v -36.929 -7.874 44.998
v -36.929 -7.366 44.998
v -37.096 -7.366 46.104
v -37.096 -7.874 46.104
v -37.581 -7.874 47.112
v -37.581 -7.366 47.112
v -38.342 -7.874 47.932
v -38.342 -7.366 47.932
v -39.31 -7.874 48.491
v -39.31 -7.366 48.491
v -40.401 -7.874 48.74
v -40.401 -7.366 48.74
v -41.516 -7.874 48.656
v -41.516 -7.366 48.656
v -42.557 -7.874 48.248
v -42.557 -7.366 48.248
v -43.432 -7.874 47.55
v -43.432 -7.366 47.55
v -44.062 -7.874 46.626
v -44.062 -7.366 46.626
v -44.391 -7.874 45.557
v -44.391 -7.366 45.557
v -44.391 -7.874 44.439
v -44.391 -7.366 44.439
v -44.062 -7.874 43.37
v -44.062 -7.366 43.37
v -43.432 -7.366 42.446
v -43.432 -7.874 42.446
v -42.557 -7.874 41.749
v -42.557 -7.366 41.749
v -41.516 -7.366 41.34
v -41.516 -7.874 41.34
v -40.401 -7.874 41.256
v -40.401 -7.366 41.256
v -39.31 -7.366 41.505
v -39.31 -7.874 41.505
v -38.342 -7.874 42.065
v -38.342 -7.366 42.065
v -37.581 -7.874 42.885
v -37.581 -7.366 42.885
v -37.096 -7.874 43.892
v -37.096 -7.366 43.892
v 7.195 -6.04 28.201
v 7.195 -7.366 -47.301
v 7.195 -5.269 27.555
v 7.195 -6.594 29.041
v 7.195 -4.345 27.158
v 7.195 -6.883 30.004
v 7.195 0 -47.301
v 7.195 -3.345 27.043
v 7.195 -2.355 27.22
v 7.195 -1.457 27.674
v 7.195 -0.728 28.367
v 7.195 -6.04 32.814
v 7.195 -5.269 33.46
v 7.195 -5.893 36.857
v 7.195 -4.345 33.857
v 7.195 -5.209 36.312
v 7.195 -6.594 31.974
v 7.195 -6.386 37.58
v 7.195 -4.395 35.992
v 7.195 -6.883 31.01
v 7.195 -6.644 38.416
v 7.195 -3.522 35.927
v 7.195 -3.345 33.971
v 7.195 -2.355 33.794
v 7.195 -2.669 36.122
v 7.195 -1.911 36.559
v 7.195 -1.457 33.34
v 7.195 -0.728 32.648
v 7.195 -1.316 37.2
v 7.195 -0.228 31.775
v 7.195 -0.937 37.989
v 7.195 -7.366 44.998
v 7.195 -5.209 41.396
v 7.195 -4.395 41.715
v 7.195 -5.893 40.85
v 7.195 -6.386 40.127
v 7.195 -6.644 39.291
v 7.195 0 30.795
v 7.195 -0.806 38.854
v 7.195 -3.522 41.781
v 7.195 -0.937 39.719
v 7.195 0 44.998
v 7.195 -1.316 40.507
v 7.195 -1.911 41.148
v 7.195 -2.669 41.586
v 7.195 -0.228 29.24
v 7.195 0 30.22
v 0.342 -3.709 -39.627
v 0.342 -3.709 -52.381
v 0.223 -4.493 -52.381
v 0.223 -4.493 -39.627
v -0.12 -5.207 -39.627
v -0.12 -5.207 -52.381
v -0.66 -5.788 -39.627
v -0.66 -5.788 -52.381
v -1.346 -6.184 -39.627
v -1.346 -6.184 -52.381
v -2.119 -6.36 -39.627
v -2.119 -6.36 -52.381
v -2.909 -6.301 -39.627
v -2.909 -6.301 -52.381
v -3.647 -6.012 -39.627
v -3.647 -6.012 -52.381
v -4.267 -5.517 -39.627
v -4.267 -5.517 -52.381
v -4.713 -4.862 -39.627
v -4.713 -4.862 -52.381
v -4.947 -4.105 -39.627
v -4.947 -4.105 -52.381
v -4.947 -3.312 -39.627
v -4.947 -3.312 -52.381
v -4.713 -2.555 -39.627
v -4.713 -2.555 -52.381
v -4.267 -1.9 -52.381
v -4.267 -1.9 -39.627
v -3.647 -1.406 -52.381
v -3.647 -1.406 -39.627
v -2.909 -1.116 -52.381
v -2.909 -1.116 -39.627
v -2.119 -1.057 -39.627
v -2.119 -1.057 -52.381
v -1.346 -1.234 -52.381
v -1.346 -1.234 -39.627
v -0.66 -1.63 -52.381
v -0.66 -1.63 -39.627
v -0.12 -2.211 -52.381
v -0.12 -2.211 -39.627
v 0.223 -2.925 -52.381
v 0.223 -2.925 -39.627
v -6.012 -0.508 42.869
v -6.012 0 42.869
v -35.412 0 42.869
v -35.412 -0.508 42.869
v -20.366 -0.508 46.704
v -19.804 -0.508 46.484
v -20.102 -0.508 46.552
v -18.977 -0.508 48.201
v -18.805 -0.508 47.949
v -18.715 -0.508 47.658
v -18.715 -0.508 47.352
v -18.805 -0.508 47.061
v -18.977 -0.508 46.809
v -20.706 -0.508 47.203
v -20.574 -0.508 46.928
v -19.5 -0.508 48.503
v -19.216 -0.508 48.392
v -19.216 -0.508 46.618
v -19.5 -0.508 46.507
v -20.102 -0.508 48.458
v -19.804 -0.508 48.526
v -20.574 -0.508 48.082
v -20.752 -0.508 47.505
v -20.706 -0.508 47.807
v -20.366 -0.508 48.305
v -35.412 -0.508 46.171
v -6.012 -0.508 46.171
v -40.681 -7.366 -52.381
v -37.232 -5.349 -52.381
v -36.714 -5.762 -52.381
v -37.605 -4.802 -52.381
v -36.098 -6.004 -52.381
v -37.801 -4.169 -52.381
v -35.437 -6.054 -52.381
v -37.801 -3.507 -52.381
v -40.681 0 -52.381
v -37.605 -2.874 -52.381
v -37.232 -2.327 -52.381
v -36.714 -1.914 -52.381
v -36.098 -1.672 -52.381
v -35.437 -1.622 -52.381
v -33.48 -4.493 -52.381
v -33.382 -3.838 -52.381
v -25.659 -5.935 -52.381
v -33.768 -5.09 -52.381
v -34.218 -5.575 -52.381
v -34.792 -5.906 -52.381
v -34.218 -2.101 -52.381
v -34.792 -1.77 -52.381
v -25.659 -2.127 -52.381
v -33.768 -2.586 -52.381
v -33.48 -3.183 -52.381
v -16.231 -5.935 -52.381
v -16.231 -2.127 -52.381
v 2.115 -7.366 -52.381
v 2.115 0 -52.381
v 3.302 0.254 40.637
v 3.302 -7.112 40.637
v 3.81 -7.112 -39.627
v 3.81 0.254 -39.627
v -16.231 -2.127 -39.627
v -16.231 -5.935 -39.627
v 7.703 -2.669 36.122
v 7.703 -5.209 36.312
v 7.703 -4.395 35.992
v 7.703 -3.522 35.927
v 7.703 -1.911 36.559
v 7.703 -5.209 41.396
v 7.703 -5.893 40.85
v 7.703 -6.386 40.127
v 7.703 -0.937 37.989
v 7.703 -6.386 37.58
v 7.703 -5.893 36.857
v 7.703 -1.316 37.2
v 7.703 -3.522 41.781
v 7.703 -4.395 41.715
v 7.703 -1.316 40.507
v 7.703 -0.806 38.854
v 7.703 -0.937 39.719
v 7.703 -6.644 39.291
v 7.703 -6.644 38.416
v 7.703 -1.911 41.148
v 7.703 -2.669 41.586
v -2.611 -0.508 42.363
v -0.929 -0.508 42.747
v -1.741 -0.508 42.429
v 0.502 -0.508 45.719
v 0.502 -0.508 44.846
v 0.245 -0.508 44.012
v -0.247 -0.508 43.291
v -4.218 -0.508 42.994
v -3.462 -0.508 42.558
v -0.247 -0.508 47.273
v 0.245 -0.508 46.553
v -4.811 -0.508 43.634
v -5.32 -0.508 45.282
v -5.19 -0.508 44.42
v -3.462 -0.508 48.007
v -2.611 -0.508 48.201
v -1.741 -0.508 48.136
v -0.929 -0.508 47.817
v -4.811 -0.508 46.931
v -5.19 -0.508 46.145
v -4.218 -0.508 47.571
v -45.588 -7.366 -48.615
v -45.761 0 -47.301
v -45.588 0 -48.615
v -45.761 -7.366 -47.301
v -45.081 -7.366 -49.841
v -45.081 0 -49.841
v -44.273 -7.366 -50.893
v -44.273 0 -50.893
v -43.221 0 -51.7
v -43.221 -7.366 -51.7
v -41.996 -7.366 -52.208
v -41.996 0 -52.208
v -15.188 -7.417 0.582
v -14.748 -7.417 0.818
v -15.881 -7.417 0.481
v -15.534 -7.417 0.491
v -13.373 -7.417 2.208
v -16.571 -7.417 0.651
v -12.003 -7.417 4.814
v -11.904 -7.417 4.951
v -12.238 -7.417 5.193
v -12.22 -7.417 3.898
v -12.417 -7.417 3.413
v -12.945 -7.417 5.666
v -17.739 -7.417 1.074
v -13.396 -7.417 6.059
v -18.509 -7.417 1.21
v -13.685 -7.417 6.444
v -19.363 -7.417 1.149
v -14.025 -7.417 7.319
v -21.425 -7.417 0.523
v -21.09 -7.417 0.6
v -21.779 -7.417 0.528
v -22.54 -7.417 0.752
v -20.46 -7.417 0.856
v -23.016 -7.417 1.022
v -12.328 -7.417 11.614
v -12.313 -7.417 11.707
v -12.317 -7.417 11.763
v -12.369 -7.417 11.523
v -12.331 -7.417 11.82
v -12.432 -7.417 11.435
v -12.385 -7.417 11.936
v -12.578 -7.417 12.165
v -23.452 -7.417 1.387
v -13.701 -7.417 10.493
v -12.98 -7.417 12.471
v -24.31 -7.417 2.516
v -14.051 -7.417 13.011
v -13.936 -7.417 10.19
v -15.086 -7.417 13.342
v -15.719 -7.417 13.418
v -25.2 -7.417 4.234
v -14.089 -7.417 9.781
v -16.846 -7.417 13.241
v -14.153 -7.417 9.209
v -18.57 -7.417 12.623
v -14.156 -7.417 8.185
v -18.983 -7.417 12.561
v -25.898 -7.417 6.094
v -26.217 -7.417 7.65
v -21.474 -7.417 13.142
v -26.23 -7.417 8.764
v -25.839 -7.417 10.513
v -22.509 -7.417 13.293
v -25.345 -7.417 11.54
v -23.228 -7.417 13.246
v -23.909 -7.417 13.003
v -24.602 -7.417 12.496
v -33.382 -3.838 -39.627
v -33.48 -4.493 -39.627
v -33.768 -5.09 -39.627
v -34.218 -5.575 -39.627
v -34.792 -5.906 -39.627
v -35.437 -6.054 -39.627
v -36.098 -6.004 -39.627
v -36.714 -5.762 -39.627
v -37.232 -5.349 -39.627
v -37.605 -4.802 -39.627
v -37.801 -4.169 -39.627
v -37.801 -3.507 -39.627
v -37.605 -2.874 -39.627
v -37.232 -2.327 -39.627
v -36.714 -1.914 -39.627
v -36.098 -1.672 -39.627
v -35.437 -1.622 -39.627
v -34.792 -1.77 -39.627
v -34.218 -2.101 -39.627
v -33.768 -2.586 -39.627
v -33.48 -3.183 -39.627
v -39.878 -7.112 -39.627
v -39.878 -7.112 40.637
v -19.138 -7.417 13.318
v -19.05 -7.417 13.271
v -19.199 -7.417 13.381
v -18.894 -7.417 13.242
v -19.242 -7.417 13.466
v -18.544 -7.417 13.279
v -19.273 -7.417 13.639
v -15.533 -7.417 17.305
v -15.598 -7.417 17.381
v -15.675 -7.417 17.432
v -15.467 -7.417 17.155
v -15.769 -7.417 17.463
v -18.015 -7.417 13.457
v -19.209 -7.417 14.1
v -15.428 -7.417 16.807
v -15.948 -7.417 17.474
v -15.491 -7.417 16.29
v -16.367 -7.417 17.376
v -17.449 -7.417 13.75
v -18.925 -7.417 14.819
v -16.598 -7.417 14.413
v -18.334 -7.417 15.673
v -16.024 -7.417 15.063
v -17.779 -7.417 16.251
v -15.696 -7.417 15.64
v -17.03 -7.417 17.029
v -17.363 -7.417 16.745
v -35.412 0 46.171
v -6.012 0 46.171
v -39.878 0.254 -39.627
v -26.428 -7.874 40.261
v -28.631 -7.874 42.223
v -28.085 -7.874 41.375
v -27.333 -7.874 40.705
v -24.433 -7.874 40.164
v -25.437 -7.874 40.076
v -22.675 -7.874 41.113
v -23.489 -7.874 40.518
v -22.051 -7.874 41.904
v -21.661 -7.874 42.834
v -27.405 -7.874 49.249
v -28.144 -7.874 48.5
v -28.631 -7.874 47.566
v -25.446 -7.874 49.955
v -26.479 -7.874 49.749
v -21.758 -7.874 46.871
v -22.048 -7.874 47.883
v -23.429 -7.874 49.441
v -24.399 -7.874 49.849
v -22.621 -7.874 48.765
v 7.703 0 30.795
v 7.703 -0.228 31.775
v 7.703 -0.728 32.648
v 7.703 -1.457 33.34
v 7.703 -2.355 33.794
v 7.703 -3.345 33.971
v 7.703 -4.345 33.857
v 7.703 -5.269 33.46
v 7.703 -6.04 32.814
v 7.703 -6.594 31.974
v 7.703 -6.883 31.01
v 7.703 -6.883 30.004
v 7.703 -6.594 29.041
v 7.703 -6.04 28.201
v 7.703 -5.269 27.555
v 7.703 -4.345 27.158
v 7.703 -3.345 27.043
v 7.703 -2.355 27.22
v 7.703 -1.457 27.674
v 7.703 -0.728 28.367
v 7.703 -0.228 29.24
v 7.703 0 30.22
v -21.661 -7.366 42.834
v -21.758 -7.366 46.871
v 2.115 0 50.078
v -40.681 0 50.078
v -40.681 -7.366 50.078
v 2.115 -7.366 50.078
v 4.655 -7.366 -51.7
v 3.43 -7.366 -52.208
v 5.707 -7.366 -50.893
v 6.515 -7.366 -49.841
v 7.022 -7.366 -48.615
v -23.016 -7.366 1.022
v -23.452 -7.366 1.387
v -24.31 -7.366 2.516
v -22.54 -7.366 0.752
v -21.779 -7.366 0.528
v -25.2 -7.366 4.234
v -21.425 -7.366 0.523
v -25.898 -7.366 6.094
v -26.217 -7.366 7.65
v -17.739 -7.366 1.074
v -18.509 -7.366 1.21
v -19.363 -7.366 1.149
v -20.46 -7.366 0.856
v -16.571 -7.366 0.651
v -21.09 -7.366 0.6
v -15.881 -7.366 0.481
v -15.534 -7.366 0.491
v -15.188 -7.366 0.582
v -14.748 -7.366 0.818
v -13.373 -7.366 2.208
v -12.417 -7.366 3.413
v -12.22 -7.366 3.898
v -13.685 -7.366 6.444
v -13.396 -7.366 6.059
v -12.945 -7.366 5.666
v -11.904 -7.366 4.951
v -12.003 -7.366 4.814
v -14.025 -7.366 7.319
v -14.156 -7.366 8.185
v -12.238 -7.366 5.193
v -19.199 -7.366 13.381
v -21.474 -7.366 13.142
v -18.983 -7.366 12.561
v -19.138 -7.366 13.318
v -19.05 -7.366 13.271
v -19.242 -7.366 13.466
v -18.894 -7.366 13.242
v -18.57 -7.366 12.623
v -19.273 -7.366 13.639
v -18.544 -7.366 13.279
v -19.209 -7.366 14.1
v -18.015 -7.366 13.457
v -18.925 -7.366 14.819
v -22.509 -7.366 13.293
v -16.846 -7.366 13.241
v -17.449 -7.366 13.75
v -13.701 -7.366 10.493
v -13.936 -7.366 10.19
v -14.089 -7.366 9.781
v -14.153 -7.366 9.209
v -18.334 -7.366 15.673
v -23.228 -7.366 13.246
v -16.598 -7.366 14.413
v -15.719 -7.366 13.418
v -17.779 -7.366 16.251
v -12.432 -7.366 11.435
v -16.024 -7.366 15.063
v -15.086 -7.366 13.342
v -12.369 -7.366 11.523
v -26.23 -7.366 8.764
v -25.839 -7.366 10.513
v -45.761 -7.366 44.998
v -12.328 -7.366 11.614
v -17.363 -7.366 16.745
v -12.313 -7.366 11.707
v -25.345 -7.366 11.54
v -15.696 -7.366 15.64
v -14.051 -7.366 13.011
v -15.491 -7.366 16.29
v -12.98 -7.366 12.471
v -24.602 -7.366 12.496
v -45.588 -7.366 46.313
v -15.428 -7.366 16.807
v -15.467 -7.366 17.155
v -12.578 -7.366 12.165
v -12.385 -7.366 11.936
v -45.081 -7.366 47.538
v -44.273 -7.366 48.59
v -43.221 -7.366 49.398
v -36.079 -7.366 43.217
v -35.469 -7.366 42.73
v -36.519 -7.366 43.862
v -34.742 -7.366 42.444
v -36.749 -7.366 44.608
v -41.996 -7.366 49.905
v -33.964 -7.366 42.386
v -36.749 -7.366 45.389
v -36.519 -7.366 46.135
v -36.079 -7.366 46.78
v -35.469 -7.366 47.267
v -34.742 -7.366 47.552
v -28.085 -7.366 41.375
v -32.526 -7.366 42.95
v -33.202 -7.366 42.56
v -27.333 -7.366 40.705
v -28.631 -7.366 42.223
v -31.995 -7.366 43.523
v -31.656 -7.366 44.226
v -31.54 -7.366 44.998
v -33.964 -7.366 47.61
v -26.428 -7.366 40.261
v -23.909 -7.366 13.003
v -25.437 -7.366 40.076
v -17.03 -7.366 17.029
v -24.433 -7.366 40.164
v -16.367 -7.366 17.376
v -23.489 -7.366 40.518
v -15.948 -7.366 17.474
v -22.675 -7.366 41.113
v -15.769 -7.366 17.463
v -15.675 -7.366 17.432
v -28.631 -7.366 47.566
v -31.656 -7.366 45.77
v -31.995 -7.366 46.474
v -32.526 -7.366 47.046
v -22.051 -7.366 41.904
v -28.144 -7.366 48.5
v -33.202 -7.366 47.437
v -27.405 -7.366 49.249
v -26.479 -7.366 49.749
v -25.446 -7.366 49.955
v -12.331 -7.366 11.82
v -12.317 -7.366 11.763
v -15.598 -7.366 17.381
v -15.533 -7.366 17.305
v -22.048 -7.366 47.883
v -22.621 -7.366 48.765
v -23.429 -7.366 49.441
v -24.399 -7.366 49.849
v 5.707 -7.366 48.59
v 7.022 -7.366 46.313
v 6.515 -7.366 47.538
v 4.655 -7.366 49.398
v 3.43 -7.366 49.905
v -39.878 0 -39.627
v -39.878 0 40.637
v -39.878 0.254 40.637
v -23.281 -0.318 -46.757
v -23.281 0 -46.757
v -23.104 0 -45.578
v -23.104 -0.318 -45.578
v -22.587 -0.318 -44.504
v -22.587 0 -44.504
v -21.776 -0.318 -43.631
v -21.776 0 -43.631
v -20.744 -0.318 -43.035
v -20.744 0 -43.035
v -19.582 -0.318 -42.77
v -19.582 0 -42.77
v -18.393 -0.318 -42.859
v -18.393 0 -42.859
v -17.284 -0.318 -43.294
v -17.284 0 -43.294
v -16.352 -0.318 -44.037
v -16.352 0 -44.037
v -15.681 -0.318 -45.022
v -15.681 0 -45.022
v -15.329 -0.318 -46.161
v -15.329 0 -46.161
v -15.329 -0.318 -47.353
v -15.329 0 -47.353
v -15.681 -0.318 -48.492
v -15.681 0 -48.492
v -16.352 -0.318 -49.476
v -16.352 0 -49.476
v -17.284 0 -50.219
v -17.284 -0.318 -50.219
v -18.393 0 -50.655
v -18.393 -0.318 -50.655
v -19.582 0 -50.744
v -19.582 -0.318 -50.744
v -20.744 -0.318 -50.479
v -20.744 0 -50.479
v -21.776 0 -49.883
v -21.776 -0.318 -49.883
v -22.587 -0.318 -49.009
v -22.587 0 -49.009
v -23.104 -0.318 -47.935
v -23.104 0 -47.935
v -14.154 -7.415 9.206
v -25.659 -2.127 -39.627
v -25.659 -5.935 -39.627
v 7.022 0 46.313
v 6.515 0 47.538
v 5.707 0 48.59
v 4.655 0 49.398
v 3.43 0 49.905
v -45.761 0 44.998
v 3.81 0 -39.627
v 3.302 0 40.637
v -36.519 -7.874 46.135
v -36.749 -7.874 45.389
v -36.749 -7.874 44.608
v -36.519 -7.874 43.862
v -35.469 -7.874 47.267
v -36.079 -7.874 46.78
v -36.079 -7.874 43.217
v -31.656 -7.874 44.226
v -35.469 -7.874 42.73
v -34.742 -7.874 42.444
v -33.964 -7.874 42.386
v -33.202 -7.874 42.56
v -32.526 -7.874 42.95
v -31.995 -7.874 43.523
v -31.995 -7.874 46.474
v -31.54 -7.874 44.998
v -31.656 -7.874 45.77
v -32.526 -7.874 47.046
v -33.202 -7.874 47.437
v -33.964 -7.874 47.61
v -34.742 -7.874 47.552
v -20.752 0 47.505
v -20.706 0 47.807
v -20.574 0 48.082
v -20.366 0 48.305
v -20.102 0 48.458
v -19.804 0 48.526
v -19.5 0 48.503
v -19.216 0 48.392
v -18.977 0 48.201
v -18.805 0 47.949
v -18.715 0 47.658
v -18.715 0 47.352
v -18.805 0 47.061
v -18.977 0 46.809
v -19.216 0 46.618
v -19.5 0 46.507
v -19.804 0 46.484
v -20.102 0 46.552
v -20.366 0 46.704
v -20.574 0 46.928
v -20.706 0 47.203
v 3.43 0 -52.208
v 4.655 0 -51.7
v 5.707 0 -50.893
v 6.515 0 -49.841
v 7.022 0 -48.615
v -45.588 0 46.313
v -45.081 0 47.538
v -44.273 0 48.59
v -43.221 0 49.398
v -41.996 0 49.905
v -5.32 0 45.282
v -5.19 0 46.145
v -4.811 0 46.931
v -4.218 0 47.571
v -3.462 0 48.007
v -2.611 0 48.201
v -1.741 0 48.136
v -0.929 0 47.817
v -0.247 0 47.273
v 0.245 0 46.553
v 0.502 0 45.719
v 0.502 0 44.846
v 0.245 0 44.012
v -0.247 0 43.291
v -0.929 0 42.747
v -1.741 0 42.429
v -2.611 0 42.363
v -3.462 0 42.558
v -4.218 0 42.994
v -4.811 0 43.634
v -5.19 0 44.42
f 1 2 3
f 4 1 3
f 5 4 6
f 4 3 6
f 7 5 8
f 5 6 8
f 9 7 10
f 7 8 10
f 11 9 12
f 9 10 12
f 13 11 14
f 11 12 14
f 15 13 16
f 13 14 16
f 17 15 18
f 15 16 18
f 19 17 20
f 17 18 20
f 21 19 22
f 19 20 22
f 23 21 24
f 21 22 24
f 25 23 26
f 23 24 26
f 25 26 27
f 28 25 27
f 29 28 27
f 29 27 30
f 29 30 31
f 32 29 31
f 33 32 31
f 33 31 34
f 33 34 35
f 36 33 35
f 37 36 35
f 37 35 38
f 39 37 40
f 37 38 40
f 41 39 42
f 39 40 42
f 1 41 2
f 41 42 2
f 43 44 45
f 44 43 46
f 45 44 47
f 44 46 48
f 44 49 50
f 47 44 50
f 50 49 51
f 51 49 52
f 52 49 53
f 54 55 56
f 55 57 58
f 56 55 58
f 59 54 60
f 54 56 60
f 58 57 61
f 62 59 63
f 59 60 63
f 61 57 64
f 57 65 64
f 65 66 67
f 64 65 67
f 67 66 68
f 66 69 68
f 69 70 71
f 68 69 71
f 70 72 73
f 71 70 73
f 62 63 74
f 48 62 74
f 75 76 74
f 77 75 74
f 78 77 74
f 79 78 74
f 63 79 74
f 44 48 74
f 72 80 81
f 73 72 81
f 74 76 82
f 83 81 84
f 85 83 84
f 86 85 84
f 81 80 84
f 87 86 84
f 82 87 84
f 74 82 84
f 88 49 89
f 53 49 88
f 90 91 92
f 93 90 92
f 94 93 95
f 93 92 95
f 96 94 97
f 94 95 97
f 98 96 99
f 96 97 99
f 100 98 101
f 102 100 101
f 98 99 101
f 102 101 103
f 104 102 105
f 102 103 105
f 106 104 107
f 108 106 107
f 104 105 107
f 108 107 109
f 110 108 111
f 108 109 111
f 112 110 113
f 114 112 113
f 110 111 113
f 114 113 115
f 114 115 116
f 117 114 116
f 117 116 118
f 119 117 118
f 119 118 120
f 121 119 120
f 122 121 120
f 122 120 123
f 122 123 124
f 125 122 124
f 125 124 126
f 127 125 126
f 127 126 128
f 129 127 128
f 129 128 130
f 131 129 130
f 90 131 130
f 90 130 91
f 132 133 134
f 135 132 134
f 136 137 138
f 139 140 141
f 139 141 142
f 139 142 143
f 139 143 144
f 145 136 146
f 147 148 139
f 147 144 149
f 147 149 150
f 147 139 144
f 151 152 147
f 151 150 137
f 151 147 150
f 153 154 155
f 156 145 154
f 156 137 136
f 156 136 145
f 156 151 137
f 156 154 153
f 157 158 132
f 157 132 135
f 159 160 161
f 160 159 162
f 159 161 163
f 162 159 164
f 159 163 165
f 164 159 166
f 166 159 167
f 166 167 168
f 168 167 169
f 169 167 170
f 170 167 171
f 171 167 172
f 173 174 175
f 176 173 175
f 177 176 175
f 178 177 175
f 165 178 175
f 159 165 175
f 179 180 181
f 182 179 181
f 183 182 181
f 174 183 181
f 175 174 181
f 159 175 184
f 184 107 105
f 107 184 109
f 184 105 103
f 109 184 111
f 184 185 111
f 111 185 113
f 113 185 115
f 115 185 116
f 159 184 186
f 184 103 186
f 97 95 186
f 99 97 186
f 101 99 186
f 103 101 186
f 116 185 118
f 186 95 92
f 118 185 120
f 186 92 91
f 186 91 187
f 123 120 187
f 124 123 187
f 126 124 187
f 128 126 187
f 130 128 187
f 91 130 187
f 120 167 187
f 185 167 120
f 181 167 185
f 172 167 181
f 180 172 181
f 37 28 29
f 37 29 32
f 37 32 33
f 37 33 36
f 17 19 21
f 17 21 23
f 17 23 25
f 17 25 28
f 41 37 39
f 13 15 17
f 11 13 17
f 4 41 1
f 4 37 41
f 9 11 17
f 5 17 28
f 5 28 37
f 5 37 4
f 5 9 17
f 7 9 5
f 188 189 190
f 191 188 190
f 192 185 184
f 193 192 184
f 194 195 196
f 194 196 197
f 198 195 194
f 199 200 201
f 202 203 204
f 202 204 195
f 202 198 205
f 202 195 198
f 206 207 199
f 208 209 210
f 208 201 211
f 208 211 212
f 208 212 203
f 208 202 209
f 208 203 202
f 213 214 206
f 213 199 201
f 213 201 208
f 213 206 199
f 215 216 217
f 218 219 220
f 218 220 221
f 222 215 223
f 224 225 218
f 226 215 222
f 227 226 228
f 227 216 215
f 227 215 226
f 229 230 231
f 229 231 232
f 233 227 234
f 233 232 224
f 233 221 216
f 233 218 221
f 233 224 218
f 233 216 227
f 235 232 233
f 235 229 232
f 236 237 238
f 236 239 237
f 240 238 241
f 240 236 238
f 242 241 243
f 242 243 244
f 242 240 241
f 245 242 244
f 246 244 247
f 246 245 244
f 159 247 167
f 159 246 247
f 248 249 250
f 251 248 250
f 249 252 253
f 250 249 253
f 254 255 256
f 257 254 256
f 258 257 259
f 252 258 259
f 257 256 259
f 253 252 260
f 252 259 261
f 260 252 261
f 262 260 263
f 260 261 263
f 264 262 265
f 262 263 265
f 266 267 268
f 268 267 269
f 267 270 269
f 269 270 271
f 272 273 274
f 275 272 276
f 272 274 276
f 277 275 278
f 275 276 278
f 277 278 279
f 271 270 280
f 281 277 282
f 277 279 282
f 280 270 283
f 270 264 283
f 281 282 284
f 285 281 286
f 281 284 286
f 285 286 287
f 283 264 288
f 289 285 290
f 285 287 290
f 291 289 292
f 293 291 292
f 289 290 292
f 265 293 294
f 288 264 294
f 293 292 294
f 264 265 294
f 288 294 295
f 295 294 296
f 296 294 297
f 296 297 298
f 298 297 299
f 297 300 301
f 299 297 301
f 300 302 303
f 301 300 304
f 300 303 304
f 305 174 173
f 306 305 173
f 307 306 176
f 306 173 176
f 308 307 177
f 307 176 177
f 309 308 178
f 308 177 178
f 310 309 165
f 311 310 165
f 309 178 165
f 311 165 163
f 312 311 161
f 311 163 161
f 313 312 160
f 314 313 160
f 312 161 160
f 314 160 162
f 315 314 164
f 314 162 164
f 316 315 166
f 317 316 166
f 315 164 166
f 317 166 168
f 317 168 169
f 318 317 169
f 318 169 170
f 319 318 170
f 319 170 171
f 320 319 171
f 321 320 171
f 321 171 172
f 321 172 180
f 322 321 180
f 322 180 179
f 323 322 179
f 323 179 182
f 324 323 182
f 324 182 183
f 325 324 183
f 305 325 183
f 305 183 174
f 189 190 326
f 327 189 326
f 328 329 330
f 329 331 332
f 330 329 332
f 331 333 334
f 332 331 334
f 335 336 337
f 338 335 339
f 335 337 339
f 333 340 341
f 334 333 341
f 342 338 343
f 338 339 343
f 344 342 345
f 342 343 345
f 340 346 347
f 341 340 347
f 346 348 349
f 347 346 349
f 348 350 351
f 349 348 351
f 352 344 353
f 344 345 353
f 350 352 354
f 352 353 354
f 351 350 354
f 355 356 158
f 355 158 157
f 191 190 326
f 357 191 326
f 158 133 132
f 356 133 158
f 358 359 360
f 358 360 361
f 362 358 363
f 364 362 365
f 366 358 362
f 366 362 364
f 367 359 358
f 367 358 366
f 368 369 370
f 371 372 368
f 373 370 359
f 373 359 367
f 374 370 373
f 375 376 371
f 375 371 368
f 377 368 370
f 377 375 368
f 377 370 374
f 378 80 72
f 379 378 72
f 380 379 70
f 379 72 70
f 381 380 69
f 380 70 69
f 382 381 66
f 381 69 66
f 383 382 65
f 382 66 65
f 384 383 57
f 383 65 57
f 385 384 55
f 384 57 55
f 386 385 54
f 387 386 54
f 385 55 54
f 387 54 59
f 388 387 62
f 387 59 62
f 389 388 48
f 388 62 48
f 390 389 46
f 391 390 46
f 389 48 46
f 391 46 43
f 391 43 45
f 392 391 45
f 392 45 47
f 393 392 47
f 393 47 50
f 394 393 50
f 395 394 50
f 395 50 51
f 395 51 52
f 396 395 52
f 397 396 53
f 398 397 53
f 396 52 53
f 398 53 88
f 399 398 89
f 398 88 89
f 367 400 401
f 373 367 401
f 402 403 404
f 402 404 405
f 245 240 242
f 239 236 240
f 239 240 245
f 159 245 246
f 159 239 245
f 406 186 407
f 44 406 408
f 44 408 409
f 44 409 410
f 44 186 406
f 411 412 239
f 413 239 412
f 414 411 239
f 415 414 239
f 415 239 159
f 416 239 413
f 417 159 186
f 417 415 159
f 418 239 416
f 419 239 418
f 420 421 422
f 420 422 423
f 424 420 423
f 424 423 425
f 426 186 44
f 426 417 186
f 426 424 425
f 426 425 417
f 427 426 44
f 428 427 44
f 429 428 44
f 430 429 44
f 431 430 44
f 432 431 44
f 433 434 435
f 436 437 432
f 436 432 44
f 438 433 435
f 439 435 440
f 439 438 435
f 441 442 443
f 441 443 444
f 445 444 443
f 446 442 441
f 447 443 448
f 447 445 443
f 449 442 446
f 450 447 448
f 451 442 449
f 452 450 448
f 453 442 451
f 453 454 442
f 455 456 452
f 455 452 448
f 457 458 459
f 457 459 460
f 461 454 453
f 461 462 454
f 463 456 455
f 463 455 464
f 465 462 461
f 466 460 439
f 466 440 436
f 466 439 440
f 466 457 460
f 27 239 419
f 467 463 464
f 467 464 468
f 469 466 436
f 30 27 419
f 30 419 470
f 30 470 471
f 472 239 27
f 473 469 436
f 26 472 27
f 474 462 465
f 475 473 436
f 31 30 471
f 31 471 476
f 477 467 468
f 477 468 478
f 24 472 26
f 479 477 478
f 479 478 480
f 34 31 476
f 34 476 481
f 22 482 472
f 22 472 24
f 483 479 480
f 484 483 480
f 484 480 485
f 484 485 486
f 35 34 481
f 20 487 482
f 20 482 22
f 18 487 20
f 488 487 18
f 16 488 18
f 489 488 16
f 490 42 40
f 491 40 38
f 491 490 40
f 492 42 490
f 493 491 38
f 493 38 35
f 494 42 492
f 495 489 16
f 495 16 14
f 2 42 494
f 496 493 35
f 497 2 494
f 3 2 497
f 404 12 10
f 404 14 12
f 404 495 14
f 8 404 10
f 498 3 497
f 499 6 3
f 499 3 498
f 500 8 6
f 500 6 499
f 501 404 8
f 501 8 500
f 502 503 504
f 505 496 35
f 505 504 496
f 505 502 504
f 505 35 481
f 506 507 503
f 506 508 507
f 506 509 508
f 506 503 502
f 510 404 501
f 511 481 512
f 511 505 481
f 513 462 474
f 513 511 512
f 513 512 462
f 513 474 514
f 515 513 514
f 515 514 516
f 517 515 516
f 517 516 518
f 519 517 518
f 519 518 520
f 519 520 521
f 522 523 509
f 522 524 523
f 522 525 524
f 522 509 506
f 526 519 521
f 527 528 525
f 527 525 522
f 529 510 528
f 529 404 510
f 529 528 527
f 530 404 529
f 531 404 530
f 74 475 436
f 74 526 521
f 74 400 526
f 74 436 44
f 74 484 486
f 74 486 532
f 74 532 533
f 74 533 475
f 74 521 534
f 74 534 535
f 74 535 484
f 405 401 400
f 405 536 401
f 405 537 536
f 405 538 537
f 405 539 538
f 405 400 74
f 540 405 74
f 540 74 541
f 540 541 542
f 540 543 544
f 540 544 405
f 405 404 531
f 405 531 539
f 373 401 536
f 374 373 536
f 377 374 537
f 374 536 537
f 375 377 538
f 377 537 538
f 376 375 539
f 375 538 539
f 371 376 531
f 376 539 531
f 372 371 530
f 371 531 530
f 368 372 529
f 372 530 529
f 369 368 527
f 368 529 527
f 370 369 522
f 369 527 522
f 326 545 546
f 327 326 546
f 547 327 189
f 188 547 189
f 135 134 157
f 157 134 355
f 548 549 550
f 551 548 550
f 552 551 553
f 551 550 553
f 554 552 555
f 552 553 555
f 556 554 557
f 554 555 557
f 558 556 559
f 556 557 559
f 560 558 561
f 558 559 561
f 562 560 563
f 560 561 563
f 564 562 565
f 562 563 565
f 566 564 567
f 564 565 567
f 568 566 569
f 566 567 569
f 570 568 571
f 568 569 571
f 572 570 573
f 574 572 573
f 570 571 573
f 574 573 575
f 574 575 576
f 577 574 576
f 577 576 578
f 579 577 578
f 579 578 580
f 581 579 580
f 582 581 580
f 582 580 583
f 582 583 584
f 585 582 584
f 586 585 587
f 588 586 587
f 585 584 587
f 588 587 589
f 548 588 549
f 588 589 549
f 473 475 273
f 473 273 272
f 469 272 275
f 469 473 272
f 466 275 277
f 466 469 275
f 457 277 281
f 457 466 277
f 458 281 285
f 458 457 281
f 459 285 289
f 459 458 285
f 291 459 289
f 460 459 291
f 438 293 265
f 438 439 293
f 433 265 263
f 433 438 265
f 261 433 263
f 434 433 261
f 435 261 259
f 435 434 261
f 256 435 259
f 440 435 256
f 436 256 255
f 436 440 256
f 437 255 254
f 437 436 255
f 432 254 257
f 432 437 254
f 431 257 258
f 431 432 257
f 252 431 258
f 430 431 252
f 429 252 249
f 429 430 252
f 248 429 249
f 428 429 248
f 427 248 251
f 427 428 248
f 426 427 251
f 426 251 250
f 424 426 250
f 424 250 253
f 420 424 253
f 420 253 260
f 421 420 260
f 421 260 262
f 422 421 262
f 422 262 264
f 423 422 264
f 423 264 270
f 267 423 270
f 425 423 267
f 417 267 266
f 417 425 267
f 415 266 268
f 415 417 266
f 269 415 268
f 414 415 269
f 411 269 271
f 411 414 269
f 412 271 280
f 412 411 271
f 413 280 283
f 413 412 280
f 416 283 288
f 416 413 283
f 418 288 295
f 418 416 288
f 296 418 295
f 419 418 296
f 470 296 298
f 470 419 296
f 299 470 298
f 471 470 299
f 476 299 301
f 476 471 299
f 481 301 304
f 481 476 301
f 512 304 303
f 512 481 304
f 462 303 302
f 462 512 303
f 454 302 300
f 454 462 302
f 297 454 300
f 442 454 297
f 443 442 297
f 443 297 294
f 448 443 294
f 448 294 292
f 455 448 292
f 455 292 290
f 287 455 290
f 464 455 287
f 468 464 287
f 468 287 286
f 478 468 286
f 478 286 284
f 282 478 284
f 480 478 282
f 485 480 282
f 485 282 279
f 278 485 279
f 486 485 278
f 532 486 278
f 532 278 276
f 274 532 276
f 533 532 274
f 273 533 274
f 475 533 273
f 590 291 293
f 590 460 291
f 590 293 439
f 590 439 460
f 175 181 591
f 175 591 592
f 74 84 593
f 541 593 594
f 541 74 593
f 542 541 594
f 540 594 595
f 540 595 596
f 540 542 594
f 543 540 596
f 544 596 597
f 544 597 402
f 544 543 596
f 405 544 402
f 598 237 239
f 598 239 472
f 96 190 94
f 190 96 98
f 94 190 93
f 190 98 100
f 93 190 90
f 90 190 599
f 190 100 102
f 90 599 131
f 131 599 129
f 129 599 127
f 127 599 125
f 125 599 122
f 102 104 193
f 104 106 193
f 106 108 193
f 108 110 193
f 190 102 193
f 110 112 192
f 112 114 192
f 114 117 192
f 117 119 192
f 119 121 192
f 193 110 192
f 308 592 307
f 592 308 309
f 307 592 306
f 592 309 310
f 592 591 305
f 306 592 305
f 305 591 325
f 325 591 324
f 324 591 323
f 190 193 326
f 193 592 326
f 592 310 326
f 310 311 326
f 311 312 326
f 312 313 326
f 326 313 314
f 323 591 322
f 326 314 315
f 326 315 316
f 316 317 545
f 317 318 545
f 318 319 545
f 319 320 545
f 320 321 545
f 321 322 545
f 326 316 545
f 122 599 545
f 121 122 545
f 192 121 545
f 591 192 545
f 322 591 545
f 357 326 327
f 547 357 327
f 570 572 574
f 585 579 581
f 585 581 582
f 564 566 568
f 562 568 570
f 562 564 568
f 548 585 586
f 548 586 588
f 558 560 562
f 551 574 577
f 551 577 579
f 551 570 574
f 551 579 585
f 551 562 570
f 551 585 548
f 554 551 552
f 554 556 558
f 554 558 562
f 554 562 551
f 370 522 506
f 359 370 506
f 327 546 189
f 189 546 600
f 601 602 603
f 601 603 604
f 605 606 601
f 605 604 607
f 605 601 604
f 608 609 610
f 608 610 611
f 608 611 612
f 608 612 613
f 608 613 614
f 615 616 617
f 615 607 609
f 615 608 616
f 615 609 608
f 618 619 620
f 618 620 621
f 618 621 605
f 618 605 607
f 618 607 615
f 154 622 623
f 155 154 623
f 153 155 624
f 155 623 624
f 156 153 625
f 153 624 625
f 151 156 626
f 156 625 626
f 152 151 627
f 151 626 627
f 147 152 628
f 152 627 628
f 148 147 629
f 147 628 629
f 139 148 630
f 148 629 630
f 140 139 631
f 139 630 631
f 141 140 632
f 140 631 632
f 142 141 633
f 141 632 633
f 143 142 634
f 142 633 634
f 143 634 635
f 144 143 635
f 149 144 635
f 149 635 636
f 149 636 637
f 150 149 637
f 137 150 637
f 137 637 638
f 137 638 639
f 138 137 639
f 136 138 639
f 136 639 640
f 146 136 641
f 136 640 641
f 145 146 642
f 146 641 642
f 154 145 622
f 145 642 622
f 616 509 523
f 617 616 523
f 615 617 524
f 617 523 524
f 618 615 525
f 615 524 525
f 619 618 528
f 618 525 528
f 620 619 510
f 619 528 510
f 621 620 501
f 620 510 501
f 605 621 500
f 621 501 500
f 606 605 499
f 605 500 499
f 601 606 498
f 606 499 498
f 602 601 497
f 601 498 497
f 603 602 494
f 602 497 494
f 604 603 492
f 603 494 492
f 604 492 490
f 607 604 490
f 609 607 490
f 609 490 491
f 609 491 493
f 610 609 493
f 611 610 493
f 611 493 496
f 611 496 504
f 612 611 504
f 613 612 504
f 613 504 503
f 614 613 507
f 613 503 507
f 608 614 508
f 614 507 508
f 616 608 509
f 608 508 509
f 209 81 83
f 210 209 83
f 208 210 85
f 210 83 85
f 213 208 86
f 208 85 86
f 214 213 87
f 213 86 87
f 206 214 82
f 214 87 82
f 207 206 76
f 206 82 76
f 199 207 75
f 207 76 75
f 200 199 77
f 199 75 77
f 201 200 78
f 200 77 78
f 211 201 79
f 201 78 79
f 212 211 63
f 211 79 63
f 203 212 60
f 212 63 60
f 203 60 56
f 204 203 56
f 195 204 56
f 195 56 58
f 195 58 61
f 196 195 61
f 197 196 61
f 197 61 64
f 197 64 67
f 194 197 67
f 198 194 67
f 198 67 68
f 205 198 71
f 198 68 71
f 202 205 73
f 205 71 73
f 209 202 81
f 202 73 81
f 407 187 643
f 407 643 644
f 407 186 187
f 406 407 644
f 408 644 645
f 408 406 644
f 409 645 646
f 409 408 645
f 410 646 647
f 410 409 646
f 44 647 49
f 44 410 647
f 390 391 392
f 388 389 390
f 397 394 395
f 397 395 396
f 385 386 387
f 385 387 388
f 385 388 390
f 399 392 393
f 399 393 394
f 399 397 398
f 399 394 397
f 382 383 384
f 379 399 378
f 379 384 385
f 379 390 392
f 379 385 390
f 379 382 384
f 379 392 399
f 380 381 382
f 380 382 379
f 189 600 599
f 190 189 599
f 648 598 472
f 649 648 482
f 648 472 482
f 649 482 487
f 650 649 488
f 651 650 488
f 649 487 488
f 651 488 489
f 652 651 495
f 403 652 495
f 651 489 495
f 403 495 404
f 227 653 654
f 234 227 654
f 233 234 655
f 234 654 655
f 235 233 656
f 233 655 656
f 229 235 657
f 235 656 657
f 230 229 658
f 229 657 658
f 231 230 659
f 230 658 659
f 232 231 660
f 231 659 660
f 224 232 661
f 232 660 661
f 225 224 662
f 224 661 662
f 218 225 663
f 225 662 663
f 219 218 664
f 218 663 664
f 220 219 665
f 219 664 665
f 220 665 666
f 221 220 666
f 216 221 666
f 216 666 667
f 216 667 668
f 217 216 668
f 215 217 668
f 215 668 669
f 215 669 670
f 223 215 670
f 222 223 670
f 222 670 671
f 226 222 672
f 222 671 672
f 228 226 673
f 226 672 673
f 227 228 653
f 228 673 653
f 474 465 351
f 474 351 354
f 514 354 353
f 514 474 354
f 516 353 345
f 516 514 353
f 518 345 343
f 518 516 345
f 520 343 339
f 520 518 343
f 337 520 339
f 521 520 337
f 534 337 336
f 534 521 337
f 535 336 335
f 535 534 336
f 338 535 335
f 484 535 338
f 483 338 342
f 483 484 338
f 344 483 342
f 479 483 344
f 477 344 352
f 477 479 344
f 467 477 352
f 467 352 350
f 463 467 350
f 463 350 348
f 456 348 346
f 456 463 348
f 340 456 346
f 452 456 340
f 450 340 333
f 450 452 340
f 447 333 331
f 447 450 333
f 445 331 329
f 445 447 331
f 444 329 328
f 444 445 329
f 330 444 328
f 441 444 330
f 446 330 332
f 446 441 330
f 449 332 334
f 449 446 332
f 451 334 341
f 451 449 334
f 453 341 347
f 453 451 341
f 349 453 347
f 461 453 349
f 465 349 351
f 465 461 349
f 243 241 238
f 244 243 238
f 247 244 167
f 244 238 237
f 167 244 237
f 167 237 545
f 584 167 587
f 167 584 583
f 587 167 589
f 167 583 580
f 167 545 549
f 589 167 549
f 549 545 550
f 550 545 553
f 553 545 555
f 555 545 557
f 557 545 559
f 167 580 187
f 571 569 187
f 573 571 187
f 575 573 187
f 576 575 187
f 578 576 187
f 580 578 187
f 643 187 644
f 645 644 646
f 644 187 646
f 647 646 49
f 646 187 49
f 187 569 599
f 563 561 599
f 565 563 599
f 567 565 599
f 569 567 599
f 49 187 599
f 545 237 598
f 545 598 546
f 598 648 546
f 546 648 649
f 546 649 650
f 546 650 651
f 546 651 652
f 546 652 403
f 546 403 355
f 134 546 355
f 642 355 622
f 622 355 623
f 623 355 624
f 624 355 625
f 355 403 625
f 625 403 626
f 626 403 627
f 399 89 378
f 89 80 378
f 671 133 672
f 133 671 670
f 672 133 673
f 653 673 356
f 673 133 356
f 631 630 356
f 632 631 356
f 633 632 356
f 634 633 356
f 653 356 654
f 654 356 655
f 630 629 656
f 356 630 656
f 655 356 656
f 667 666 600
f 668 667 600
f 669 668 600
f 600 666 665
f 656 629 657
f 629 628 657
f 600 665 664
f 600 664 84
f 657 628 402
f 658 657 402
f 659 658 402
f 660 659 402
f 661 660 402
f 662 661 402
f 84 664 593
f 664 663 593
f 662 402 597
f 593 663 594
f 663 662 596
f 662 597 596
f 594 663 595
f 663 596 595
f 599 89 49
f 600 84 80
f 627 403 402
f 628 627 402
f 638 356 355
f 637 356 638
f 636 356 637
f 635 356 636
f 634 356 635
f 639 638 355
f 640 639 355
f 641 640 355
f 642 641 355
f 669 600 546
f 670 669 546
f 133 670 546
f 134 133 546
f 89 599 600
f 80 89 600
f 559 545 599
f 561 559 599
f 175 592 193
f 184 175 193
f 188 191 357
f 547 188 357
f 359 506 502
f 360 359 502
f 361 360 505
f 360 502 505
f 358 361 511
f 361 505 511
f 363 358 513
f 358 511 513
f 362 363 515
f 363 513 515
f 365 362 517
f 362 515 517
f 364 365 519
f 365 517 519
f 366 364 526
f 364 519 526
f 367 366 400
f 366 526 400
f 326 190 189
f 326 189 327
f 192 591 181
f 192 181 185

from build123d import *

# Parameters (mm, degrees)
F0_W      = 52.9562598094
F0_H      = 102.458845824
F1_DEPTH  = 7.366
F2_R      = 5.08
F4_R      = 2.6590711811
F4_W      = 9.4277970493
F4_H      = 3.8080494851
F4_R_2    = 2.2218501958
F5_DEPTH  = 25.4
F3_R      = 3.9983268575
F6_DEPTH  = 0.3175
F8_DEPTH  = 7.112
F9_R      = 3.7522124086
F10_DEPTH = 0.508
F9_R_2    = 2.6194678396
F11_DEPTH = 0.508
F13_DEPTH = 7.366
F14_R     = 2.927204105
F14_W     = 29.4005014002
F14_H     = 3.302000463
F14_R_2   = 1.0239087259
F15_DEPTH = 0.508
F18_DEPTH = 0.0508
F19_R     = 2.9350553776
F20_DEPTH = 0.508


# Not quite as in the source:
# - a feature of the source that left no trace in its solid (it failed there, or was rolled back) is left out


with BuildPart() as f1:
    # F0 (on Front) → F1 (new body)
    with BuildSketch(Plane.XZ):
        with Locations((-19.2829859443, -1.1512245983)):
            Rectangle(F0_W, F0_H)
    extrude(amount=F1_DEPTH)

    # F2
    f2_edges = [f1.edges().sort_by_distance(p)[0] for p in [
        (-45.761116, -3.683, 50.078198),
        (7.195144, -3.683, 50.078198),
        (7.195144, -3.683, -52.380648),
        (-45.761116, -3.683, -52.380648),
    ]]
    fillet(f2_edges, radius=F2_R)

    # F4 (on face) → F5 (cut)
    with BuildSketch(Plane(origin=(0, 0, -52.3806475103), x_dir=(1, 0, 0), z_dir=(0, 0, -1))):
        with Locations((-2.3175266106, 3.70877143)):
            Circle(F4_R)
        with Locations((-20.9451001137, 4.031334538)):
            Rectangle(F4_W, F4_H)
        with Locations((-35.6035269797, 3.8380967453)):
            Circle(F4_R_2)
    extrude(amount=-F5_DEPTH, mode=Mode.SUBTRACT)

    # F3 (on face) → F6 (cut)
    with BuildSketch(Plane(origin=(0, 0, 0), x_dir=(-1, 0, 0), z_dir=(0, 1, 0))):
        with Locations((19.2829859443, -46.756785363)):
            Circle(F3_R)
    extrude(amount=-F6_DEPTH, mode=Mode.SUBTRACT)

    # F7 (on face) → F8 (cut)
    with BuildSketch(Plane(origin=(0, 0, 0), x_dir=(-1, 0, 0), z_dir=(0, 1, 0))):
        Polygon((39.8780032992, 40.6373552978), (-3.3019997645, 40.6373552978), (-3.8099999074, -39.6266467869), (39.8780032992, -39.6266467869), align=None)
    extrude(amount=-F8_DEPTH, mode=Mode.SUBTRACT)

    # F9 (on face) → F10 (join)
    with BuildSketch(Plane.XZ.offset(7.366)):
        with Locations((-40.681115849, 44.9981983137)):
            Circle(F9_R)
    extrude(amount=F10_DEPTH)

    # F9 (on face) → F11 (join)
    with BuildSketch(Plane.XZ.offset(7.366)):
        with Locations((-40.681115849, 44.9981983137)):
            Circle(F9_R)
        with BuildLine():
            Line((-21.6612099299, 42.8335605604), (-21.757948526, 46.8708315703))
            ThreePointArc((-21.757948526, 46.8708315703), (-24.9186836694, 49.9411794414), (-28.6305304617, 47.56642133))
            Line((-28.6305304617, 47.56642133), (-28.6305304617, 42.2230027616))
            ThreePointArc((-28.6305304617, 42.2230027616), (-24.9319153156, 40.0860556465), (-21.6612099299, 42.8335605604))
        make_face()
        with Locations((-34.1592803597, 44.9981983137)):
            Circle(F9_R_2)
    extrude(amount=F11_DEPTH)

    # F14 (on face) → F15 (cut)
    with BuildSketch(Plane(origin=(0, 0, 0), x_dir=(-1, 0, 0), z_dir=(0, 1, 0))):
        with Locations((2.3924480192, 45.2824570239)):
            Circle(F14_R)
        with Locations((20.7121986896, 44.5204563439)):
            Rectangle(F14_W, F14_H)
        with Locations((19.727949053, 47.5049614906)):
            Circle(F14_R_2)
    extrude(amount=-F15_DEPTH, mode=Mode.SUBTRACT)

    # F17 (on face) → F18 (join)
    with BuildSketch(Plane.XZ.offset(7.366)):
        with BuildLine():
            add(Edge.make_bspline(
                [(-12.313099578, 11.7068113759), (-12.3182719745, 11.2693172346), (-14.0471777892, 10.6426821522), (-14.1694497269, 9.1976154433), (-14.1923588981, 7.8253429333), (-13.757045673, 6.2502584285), (-12.732998031, 5.4901288014), (-11.7868601393, 4.9184492153), (-12.0625993678, 4.9249552084), (-12.1356791253, 3.442670809), (-13.4938891698, 2.1372915784), (-14.6469691571, 0.7161487492), (-15.8059393346, 0.355170558), (-16.8810715776, 0.7668398235), (-18.1810906095, 1.2782789872), (-19.4231192534, 1.1799743607), (-20.6034478055, 0.8441669396), (-21.4837195128, 0.3523397632), (-23.1053492827, 0.8727222184), (-24.3238470967, 2.3773718388), (-25.5506684803, 4.8598592274), (-26.5539056297, 8.0644702423), (-25.7467847595, 11.4294737742), (-23.2717151551, 14.0857698999), (-19.2198549823, 12.2943314765), (-18.2008775604, 12.7833222733), (-16.4425818501, 13.4295862797), (-14.8558748752, 13.5055890759), (-12.3067060672, 12.2475904084), (-12.313099578, 11.7068113759)],
                knots=[0, 0, 0, 0, 0.0391492889, 0.0727778694, 0.1067456455, 0.1424756723, 0.1765910088, 0.203123685, 0.2108828285, 0.2430017031, 0.2838259394, 0.3225995677, 0.3526017684, 0.3829884004, 0.4168954172, 0.4489787383, 0.4805794524, 0.5087166076, 0.5441864617, 0.5839082017, 0.6318706413, 0.6843397655, 0.737125556, 0.7879855348, 0.8446273684, 0.8747593402, 0.9123058727, 0.951608233, 1, 1, 1, 1], degree=3))
        make_face()
        with BuildLine():
            add(Edge.make_bspline(
                [(-17.779443413, 16.2513870746), (-17.5596513889, 16.4997277835), (-17.2523909762, 17.0381238074), (-15.2307876048, 17.9329802627), (-15.5028451921, 15.7361114376), (-16.3303567014, 14.6029182381), (-17.5839563283, 13.5203805258), (-19.6950391667, 12.8825060067), (-18.857112639, 15.3017670358), (-18.0476883571, 15.9482999183), (-17.779443413, 16.2513870746)],
                knots=[0, 0, 0, 0, 0.1034730724, 0.2289362231, 0.3537312944, 0.4791233423, 0.6151717915, 0.7370776987, 0.8737163979, 1, 1, 1, 1], degree=3))
        make_face()
    extrude(amount=F18_DEPTH)

    # F19 (on face) → F20 (join)
    with BuildSketch(Plane.YZ.offset(7.1951439604)):
        with Locations((-3.741475055, 38.8537757099)):
            Circle(F19_R)
        with BuildLine():
            Line((0, 30.2196182314), (0, 30.7952016589))
            ThreePointArc((0, 30.7952016589), (-6.9193087342, 30.5074099451), (0, 30.2196182314))
        make_face()
    extrude(amount=F20_DEPTH)


with BuildPart() as f13:
    # F12 (on face) → F13 (new body)
    with BuildSketch(Plane(origin=(0, -7.112, 0), x_dir=(-1, 0, 0), z_dir=(0, 1, 0))):
        Polygon((39.8780032992, -39.6266467869), (39.8780032992, 40.6373552978), (-3.3019997645, 40.6373552978), (-3.8099999074, -39.6266467869), align=None)
    extrude(amount=F13_DEPTH)


solid = Compound([f1.part, f13.part])
